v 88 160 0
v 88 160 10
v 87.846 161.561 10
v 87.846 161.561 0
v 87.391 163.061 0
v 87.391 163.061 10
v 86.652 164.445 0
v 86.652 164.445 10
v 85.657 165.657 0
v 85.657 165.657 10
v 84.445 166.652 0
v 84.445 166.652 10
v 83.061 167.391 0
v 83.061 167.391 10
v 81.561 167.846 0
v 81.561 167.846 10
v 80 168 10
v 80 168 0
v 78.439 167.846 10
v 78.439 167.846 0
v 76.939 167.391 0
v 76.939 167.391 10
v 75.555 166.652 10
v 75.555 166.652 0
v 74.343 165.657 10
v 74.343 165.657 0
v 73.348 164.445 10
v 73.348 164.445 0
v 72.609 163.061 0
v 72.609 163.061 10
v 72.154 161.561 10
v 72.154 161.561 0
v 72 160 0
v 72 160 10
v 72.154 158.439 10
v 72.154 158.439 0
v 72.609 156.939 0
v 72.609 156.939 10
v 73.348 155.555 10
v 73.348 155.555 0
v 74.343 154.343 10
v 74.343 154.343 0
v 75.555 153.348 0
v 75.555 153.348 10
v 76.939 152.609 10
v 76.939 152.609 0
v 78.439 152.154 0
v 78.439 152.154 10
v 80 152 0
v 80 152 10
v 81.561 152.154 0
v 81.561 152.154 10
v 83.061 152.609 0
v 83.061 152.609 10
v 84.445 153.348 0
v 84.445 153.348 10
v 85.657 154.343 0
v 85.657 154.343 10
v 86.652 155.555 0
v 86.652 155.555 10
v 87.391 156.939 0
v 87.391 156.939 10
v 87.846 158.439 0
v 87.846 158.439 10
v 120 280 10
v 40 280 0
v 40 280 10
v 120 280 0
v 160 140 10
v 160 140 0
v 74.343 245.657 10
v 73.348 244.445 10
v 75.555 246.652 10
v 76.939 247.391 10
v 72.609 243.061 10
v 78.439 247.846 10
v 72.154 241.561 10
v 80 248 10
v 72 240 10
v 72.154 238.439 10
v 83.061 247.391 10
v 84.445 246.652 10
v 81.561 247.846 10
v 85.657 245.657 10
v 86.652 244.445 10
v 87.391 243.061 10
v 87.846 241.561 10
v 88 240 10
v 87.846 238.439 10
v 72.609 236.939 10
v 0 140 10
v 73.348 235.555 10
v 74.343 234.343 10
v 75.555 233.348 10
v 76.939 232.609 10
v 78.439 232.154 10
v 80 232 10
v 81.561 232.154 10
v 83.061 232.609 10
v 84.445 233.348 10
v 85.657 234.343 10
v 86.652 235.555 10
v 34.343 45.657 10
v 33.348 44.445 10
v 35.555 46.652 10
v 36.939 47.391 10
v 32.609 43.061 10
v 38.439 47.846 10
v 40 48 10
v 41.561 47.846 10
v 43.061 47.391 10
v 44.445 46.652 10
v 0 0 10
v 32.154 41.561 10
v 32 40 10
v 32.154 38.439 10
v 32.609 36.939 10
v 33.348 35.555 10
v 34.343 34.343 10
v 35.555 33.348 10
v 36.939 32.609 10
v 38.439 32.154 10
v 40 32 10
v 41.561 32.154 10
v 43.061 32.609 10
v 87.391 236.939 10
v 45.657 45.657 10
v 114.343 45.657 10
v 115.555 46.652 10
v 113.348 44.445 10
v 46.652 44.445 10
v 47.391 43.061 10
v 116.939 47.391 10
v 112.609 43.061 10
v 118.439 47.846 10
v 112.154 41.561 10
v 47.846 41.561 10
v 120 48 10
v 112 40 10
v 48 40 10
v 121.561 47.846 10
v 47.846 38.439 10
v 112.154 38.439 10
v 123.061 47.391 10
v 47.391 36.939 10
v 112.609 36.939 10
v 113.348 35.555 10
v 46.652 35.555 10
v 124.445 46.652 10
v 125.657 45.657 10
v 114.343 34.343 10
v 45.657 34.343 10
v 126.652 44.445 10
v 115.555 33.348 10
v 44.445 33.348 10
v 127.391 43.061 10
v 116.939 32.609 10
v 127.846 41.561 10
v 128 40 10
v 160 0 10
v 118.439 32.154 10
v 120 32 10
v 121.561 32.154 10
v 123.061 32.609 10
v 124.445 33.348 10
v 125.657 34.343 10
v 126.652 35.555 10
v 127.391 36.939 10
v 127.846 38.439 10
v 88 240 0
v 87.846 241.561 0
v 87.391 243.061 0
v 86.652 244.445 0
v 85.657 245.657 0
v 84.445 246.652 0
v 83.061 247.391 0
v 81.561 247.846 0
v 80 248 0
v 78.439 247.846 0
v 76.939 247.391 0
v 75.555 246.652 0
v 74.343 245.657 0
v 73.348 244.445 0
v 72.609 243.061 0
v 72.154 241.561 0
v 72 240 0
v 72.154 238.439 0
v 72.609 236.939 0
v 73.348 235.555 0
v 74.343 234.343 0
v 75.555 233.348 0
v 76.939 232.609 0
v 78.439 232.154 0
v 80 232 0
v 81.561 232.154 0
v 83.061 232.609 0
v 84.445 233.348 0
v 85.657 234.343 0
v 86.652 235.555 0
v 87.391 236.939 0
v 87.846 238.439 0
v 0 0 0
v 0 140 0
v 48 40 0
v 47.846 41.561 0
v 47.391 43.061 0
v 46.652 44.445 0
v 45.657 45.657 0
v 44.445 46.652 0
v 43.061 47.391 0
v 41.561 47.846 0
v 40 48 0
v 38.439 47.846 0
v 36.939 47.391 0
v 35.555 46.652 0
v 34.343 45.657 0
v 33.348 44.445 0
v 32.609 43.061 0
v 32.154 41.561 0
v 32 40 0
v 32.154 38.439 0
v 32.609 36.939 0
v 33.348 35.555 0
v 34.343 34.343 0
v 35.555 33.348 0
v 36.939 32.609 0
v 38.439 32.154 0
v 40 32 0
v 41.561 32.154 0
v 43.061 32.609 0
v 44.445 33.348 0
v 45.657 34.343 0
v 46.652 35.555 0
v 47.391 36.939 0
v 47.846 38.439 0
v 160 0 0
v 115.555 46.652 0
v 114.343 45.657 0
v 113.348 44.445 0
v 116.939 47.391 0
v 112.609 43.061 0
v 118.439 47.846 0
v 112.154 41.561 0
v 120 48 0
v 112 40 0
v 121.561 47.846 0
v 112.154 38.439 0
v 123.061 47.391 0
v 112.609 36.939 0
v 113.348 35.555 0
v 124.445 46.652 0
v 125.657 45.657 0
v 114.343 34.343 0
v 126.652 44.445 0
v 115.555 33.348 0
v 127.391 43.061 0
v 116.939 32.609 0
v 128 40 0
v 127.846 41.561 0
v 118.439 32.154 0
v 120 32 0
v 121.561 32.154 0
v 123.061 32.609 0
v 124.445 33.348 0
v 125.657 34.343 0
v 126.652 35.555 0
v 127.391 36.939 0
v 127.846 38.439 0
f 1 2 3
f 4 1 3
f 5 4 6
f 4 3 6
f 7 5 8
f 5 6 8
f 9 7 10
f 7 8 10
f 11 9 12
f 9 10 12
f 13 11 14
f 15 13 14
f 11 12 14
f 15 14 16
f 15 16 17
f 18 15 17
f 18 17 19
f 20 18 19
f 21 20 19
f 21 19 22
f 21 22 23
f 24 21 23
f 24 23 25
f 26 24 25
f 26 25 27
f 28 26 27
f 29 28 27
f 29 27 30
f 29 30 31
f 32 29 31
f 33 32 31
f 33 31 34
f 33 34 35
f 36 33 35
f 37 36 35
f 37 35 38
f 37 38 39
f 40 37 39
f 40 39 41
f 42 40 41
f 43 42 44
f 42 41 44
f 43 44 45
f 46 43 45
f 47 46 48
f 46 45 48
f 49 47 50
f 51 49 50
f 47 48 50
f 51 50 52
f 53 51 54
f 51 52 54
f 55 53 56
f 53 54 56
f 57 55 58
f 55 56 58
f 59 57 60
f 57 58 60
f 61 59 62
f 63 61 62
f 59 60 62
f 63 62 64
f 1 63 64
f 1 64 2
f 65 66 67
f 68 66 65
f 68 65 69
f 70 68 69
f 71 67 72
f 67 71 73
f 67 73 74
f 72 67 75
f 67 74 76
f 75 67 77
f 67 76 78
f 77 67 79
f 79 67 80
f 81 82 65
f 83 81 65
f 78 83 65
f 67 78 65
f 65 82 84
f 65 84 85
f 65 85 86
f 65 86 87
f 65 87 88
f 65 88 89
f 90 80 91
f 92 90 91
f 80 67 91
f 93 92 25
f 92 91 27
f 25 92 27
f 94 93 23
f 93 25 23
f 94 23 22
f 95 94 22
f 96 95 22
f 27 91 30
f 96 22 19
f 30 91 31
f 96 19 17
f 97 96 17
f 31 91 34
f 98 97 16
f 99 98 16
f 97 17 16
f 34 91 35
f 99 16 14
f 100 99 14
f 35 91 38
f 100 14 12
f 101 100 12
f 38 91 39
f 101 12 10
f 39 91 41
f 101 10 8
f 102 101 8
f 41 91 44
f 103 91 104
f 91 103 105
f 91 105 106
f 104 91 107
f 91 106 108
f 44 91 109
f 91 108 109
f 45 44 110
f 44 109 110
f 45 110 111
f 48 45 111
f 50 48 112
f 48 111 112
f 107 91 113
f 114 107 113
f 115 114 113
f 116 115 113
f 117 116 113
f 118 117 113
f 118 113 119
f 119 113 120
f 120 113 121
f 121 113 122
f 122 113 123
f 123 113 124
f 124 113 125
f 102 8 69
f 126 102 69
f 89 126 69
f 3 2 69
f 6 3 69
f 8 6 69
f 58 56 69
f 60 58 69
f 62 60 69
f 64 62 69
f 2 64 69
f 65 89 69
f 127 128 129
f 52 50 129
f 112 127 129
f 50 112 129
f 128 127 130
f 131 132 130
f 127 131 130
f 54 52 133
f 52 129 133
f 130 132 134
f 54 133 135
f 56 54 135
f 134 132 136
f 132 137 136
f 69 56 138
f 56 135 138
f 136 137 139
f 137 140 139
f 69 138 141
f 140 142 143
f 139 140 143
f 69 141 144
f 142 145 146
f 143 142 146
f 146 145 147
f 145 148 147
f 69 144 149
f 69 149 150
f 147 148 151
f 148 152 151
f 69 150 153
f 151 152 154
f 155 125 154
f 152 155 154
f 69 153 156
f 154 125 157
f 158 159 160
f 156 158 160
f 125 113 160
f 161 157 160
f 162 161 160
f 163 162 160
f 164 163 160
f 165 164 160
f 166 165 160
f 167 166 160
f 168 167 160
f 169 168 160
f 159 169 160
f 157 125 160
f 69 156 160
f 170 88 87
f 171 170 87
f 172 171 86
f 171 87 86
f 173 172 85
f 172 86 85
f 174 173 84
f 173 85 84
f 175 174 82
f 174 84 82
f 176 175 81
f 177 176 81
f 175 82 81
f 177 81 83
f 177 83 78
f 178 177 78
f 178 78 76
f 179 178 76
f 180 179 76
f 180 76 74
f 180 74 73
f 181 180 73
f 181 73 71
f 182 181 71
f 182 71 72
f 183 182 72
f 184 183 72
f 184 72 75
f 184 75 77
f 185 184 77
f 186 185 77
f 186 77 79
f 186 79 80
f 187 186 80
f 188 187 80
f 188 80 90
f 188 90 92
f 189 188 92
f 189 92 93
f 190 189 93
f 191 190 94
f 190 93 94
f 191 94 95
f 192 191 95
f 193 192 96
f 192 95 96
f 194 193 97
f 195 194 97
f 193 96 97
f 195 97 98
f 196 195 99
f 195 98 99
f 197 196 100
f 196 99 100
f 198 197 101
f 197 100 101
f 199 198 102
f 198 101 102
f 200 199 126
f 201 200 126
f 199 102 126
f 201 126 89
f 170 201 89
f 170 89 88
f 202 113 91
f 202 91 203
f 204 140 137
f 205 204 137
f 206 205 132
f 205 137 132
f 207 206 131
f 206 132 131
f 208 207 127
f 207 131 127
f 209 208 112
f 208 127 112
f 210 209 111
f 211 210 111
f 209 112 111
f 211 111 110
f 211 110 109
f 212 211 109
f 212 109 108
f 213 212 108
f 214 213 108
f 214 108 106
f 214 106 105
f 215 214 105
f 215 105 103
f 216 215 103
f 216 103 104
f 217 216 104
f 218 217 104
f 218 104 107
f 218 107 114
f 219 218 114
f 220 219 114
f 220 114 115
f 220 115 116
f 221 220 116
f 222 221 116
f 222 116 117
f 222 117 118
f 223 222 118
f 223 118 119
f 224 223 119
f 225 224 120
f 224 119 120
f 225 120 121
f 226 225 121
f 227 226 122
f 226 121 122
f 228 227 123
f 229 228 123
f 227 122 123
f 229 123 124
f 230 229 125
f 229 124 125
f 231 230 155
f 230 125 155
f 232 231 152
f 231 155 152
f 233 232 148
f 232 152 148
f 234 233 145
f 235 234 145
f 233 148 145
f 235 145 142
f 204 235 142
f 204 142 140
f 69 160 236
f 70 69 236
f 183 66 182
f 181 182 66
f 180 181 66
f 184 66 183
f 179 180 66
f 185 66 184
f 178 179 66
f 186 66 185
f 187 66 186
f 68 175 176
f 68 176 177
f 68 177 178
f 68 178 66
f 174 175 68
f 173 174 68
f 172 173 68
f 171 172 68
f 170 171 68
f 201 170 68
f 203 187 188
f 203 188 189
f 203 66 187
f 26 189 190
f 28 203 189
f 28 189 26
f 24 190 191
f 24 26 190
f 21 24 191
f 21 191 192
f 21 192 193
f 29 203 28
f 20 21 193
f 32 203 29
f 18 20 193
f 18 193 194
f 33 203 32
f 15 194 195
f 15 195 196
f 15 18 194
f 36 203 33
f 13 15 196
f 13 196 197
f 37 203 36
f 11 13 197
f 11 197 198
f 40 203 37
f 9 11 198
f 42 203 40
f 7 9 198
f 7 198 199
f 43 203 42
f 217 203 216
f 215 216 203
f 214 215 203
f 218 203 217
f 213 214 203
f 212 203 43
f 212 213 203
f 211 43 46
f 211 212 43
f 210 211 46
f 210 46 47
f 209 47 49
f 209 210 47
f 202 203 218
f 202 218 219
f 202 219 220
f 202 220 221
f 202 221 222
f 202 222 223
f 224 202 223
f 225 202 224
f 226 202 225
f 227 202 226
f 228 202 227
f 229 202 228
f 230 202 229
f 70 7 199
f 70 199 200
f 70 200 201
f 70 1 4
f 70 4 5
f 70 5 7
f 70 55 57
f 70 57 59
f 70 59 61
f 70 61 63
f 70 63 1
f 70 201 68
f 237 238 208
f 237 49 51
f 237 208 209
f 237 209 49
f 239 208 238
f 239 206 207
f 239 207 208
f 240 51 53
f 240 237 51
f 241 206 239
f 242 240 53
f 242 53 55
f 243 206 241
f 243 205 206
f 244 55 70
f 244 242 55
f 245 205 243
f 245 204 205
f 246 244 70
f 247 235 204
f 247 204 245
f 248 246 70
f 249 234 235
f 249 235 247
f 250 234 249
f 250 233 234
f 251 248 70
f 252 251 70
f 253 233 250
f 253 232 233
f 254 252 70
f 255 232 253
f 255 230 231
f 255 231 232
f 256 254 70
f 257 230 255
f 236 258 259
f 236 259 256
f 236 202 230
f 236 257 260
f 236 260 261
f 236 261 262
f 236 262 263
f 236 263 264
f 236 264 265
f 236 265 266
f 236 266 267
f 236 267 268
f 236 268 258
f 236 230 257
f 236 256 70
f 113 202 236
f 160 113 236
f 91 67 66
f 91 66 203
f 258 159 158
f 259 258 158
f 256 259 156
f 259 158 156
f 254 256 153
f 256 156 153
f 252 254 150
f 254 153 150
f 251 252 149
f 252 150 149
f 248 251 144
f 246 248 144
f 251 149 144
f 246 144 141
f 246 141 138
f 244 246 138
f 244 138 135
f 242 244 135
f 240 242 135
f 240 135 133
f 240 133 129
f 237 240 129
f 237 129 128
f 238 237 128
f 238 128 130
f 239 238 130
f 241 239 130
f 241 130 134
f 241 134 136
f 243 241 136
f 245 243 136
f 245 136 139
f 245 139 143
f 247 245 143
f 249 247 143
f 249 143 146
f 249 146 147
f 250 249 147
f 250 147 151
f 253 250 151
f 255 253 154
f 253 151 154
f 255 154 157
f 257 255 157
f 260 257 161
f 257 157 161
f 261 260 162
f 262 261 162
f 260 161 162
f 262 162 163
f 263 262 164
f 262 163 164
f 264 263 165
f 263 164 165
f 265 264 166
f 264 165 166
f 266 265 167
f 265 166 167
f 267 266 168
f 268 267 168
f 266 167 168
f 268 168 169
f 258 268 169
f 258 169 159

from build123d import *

# Parameters (mm, degrees)
BASE_FLANGE1_OUTLINE_W = 160
BASE_FLANGE1_OUTLINE_H = 10
BASE_FLANGE1_DEPTH     = 280
CUT_EXTRUDE2_DEPTH     = 15
SKETCH16_R             = 8
CUT_EXTRUDE4_DEPTH     = 15


# Read off the part's stored shape, not the designer's step: Base-Flange1
with BuildPart() as part:
    # Base-Flange1 outline → Base-Flange1 (new body)
    with BuildSketch(Plane(origin=(0, 0, 0), x_dir=(1, 0, 0), z_dir=(0, 1, 0))):
        with Locations((80, -5)):
            Rectangle(BASE_FLANGE1_OUTLINE_W, BASE_FLANGE1_OUTLINE_H)
    extrude(amount=BASE_FLANGE1_DEPTH)

    # Sketch12 → Cut-Extrude2 (cut)
    with BuildSketch(Plane.XY.offset(10)):
        Polygon((160, 280), (120, 280), (160, 140), align=None)
        Polygon((0, 280), (40, 280), (0, 140), align=None)
    extrude(amount=-CUT_EXTRUDE2_DEPTH, mode=Mode.SUBTRACT)

    # Sketch16 → Cut-Extrude4 (cut)
    with BuildSketch(Plane.XY.offset(10)):
        with Locations((80, 240)):
            Circle(SKETCH16_R)
        with Locations((80, 160)):
            Circle(SKETCH16_R)
        with Locations((40, 40)):
            Circle(SKETCH16_R)
        with Locations((120, 40)):
            Circle(SKETCH16_R)
    extrude(amount=-CUT_EXTRUDE4_DEPTH, mode=Mode.SUBTRACT)


solid = part.part
